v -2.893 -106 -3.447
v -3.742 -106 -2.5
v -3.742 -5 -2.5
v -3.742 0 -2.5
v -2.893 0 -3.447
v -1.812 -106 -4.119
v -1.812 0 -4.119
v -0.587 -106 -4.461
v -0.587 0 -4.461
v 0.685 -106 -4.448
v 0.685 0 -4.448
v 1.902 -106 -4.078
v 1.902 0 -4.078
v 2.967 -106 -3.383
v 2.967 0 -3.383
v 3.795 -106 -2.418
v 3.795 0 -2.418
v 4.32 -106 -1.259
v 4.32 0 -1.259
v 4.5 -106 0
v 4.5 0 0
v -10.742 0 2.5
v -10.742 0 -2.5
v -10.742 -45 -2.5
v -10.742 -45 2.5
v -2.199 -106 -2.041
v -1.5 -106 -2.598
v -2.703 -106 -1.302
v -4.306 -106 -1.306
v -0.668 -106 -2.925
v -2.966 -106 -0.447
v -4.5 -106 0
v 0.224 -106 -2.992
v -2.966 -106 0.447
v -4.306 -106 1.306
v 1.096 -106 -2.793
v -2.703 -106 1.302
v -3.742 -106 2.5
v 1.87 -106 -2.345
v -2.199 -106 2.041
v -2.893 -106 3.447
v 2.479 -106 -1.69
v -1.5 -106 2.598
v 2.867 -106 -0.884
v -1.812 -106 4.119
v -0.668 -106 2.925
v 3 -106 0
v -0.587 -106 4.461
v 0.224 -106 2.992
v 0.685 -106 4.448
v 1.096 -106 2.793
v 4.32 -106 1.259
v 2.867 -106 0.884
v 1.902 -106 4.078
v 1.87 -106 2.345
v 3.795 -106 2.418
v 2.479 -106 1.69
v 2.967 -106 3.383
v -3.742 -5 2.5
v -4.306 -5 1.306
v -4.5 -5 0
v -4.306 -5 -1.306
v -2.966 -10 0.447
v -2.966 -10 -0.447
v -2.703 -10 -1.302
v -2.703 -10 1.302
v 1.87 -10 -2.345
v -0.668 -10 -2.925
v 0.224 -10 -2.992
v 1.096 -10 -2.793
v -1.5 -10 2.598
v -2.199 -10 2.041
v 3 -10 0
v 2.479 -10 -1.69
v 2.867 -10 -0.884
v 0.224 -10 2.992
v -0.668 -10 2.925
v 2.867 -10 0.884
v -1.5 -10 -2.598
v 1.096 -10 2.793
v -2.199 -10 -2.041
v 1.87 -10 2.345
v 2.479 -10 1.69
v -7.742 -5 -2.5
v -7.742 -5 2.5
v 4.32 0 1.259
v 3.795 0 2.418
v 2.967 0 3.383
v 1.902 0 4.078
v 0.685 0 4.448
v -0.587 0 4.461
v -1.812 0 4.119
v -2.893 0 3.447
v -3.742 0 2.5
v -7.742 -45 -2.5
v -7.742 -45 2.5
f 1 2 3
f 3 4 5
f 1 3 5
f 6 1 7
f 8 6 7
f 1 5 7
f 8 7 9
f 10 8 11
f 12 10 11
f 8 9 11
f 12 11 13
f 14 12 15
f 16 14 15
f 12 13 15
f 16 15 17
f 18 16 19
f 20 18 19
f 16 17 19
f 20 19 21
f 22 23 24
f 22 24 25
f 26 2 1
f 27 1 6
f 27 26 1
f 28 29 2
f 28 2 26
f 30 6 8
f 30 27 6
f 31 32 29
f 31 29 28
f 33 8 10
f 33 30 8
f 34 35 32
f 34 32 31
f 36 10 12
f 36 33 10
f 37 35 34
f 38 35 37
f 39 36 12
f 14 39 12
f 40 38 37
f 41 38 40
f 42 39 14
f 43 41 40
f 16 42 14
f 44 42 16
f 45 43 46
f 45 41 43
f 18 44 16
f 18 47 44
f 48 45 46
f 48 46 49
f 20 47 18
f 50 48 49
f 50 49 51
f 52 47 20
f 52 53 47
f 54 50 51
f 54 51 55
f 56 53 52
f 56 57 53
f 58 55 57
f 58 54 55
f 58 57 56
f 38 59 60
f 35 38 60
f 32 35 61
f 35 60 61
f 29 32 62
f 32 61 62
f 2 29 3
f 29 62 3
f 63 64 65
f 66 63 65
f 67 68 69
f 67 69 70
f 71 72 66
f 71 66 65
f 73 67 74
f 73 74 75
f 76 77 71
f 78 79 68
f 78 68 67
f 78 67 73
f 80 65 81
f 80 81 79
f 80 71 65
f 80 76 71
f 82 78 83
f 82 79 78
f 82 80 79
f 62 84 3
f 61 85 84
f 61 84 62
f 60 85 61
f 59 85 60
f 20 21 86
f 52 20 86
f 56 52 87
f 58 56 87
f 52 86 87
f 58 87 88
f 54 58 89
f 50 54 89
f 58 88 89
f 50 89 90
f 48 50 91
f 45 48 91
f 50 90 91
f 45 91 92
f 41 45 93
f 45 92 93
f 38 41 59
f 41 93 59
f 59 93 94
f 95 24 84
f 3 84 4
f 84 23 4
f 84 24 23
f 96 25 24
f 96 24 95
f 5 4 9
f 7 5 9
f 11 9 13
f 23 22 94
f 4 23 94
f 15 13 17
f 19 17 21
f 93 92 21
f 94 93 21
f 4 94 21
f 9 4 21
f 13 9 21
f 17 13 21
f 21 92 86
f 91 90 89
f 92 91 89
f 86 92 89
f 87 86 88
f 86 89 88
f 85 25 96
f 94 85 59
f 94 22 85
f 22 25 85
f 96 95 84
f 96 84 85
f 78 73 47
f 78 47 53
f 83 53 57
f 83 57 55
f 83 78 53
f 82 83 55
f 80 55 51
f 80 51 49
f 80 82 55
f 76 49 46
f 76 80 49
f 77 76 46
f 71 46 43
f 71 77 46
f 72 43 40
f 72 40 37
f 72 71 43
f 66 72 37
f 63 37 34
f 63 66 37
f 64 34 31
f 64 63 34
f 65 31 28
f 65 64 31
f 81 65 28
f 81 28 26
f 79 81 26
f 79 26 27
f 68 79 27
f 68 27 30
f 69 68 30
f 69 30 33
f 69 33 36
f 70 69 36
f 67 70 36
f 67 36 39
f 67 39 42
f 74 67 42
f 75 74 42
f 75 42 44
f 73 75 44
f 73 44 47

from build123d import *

# Parameters (mm, degrees)
F0_R     = 3
F1_DEPTH = 106
F2_DEPTH = 10
F3_DEPTH = 5
F0_W     = 3
F0_H     = 5
F4_DEPTH = 45


with BuildPart() as f1:
    # F0 (on Front) → F1 (new body)
    with BuildSketch(Plane.XZ):
        with BuildLine():
            ThreePointArc((-3.741657, -2.5), (1.306243, -4.306243), (4.5, 0))
            ThreePointArc((4.5, 0), (1.306243, 4.306243), (-3.741657, 2.5))
            ThreePointArc((-3.741657, 2.5), (-4.5, 0), (-3.741657, -2.5))
        make_face()
        Circle(F0_R, mode=Mode.SUBTRACT)
    extrude(amount=F1_DEPTH)

    # F0 (on Front) → F2 (join)
    with BuildSketch(Plane.XZ):
        Circle(F0_R)
    extrude(amount=F2_DEPTH)

    # F0 (on Front) → F3 (join)
    with BuildSketch(Plane.XZ):
        with BuildLine():
            ThreePointArc((-3.741657, -2.5), (-4.5, 0), (-3.741657, 2.5))
            Line((-3.741657, 2.5), (-7.741657, 2.5))
            Line((-7.741657, 2.5), (-7.741657, -2.5))
            Line((-7.741657, -2.5), (-3.741657, -2.5))
        make_face()
    extrude(amount=F3_DEPTH)

    # F0 (on Front) → F4 (join)
    with BuildSketch(Plane.XZ):
        with Locations((-9.241657, 0)):
            Rectangle(F0_W, F0_H)
    extrude(amount=F4_DEPTH)


solid = f1.part
